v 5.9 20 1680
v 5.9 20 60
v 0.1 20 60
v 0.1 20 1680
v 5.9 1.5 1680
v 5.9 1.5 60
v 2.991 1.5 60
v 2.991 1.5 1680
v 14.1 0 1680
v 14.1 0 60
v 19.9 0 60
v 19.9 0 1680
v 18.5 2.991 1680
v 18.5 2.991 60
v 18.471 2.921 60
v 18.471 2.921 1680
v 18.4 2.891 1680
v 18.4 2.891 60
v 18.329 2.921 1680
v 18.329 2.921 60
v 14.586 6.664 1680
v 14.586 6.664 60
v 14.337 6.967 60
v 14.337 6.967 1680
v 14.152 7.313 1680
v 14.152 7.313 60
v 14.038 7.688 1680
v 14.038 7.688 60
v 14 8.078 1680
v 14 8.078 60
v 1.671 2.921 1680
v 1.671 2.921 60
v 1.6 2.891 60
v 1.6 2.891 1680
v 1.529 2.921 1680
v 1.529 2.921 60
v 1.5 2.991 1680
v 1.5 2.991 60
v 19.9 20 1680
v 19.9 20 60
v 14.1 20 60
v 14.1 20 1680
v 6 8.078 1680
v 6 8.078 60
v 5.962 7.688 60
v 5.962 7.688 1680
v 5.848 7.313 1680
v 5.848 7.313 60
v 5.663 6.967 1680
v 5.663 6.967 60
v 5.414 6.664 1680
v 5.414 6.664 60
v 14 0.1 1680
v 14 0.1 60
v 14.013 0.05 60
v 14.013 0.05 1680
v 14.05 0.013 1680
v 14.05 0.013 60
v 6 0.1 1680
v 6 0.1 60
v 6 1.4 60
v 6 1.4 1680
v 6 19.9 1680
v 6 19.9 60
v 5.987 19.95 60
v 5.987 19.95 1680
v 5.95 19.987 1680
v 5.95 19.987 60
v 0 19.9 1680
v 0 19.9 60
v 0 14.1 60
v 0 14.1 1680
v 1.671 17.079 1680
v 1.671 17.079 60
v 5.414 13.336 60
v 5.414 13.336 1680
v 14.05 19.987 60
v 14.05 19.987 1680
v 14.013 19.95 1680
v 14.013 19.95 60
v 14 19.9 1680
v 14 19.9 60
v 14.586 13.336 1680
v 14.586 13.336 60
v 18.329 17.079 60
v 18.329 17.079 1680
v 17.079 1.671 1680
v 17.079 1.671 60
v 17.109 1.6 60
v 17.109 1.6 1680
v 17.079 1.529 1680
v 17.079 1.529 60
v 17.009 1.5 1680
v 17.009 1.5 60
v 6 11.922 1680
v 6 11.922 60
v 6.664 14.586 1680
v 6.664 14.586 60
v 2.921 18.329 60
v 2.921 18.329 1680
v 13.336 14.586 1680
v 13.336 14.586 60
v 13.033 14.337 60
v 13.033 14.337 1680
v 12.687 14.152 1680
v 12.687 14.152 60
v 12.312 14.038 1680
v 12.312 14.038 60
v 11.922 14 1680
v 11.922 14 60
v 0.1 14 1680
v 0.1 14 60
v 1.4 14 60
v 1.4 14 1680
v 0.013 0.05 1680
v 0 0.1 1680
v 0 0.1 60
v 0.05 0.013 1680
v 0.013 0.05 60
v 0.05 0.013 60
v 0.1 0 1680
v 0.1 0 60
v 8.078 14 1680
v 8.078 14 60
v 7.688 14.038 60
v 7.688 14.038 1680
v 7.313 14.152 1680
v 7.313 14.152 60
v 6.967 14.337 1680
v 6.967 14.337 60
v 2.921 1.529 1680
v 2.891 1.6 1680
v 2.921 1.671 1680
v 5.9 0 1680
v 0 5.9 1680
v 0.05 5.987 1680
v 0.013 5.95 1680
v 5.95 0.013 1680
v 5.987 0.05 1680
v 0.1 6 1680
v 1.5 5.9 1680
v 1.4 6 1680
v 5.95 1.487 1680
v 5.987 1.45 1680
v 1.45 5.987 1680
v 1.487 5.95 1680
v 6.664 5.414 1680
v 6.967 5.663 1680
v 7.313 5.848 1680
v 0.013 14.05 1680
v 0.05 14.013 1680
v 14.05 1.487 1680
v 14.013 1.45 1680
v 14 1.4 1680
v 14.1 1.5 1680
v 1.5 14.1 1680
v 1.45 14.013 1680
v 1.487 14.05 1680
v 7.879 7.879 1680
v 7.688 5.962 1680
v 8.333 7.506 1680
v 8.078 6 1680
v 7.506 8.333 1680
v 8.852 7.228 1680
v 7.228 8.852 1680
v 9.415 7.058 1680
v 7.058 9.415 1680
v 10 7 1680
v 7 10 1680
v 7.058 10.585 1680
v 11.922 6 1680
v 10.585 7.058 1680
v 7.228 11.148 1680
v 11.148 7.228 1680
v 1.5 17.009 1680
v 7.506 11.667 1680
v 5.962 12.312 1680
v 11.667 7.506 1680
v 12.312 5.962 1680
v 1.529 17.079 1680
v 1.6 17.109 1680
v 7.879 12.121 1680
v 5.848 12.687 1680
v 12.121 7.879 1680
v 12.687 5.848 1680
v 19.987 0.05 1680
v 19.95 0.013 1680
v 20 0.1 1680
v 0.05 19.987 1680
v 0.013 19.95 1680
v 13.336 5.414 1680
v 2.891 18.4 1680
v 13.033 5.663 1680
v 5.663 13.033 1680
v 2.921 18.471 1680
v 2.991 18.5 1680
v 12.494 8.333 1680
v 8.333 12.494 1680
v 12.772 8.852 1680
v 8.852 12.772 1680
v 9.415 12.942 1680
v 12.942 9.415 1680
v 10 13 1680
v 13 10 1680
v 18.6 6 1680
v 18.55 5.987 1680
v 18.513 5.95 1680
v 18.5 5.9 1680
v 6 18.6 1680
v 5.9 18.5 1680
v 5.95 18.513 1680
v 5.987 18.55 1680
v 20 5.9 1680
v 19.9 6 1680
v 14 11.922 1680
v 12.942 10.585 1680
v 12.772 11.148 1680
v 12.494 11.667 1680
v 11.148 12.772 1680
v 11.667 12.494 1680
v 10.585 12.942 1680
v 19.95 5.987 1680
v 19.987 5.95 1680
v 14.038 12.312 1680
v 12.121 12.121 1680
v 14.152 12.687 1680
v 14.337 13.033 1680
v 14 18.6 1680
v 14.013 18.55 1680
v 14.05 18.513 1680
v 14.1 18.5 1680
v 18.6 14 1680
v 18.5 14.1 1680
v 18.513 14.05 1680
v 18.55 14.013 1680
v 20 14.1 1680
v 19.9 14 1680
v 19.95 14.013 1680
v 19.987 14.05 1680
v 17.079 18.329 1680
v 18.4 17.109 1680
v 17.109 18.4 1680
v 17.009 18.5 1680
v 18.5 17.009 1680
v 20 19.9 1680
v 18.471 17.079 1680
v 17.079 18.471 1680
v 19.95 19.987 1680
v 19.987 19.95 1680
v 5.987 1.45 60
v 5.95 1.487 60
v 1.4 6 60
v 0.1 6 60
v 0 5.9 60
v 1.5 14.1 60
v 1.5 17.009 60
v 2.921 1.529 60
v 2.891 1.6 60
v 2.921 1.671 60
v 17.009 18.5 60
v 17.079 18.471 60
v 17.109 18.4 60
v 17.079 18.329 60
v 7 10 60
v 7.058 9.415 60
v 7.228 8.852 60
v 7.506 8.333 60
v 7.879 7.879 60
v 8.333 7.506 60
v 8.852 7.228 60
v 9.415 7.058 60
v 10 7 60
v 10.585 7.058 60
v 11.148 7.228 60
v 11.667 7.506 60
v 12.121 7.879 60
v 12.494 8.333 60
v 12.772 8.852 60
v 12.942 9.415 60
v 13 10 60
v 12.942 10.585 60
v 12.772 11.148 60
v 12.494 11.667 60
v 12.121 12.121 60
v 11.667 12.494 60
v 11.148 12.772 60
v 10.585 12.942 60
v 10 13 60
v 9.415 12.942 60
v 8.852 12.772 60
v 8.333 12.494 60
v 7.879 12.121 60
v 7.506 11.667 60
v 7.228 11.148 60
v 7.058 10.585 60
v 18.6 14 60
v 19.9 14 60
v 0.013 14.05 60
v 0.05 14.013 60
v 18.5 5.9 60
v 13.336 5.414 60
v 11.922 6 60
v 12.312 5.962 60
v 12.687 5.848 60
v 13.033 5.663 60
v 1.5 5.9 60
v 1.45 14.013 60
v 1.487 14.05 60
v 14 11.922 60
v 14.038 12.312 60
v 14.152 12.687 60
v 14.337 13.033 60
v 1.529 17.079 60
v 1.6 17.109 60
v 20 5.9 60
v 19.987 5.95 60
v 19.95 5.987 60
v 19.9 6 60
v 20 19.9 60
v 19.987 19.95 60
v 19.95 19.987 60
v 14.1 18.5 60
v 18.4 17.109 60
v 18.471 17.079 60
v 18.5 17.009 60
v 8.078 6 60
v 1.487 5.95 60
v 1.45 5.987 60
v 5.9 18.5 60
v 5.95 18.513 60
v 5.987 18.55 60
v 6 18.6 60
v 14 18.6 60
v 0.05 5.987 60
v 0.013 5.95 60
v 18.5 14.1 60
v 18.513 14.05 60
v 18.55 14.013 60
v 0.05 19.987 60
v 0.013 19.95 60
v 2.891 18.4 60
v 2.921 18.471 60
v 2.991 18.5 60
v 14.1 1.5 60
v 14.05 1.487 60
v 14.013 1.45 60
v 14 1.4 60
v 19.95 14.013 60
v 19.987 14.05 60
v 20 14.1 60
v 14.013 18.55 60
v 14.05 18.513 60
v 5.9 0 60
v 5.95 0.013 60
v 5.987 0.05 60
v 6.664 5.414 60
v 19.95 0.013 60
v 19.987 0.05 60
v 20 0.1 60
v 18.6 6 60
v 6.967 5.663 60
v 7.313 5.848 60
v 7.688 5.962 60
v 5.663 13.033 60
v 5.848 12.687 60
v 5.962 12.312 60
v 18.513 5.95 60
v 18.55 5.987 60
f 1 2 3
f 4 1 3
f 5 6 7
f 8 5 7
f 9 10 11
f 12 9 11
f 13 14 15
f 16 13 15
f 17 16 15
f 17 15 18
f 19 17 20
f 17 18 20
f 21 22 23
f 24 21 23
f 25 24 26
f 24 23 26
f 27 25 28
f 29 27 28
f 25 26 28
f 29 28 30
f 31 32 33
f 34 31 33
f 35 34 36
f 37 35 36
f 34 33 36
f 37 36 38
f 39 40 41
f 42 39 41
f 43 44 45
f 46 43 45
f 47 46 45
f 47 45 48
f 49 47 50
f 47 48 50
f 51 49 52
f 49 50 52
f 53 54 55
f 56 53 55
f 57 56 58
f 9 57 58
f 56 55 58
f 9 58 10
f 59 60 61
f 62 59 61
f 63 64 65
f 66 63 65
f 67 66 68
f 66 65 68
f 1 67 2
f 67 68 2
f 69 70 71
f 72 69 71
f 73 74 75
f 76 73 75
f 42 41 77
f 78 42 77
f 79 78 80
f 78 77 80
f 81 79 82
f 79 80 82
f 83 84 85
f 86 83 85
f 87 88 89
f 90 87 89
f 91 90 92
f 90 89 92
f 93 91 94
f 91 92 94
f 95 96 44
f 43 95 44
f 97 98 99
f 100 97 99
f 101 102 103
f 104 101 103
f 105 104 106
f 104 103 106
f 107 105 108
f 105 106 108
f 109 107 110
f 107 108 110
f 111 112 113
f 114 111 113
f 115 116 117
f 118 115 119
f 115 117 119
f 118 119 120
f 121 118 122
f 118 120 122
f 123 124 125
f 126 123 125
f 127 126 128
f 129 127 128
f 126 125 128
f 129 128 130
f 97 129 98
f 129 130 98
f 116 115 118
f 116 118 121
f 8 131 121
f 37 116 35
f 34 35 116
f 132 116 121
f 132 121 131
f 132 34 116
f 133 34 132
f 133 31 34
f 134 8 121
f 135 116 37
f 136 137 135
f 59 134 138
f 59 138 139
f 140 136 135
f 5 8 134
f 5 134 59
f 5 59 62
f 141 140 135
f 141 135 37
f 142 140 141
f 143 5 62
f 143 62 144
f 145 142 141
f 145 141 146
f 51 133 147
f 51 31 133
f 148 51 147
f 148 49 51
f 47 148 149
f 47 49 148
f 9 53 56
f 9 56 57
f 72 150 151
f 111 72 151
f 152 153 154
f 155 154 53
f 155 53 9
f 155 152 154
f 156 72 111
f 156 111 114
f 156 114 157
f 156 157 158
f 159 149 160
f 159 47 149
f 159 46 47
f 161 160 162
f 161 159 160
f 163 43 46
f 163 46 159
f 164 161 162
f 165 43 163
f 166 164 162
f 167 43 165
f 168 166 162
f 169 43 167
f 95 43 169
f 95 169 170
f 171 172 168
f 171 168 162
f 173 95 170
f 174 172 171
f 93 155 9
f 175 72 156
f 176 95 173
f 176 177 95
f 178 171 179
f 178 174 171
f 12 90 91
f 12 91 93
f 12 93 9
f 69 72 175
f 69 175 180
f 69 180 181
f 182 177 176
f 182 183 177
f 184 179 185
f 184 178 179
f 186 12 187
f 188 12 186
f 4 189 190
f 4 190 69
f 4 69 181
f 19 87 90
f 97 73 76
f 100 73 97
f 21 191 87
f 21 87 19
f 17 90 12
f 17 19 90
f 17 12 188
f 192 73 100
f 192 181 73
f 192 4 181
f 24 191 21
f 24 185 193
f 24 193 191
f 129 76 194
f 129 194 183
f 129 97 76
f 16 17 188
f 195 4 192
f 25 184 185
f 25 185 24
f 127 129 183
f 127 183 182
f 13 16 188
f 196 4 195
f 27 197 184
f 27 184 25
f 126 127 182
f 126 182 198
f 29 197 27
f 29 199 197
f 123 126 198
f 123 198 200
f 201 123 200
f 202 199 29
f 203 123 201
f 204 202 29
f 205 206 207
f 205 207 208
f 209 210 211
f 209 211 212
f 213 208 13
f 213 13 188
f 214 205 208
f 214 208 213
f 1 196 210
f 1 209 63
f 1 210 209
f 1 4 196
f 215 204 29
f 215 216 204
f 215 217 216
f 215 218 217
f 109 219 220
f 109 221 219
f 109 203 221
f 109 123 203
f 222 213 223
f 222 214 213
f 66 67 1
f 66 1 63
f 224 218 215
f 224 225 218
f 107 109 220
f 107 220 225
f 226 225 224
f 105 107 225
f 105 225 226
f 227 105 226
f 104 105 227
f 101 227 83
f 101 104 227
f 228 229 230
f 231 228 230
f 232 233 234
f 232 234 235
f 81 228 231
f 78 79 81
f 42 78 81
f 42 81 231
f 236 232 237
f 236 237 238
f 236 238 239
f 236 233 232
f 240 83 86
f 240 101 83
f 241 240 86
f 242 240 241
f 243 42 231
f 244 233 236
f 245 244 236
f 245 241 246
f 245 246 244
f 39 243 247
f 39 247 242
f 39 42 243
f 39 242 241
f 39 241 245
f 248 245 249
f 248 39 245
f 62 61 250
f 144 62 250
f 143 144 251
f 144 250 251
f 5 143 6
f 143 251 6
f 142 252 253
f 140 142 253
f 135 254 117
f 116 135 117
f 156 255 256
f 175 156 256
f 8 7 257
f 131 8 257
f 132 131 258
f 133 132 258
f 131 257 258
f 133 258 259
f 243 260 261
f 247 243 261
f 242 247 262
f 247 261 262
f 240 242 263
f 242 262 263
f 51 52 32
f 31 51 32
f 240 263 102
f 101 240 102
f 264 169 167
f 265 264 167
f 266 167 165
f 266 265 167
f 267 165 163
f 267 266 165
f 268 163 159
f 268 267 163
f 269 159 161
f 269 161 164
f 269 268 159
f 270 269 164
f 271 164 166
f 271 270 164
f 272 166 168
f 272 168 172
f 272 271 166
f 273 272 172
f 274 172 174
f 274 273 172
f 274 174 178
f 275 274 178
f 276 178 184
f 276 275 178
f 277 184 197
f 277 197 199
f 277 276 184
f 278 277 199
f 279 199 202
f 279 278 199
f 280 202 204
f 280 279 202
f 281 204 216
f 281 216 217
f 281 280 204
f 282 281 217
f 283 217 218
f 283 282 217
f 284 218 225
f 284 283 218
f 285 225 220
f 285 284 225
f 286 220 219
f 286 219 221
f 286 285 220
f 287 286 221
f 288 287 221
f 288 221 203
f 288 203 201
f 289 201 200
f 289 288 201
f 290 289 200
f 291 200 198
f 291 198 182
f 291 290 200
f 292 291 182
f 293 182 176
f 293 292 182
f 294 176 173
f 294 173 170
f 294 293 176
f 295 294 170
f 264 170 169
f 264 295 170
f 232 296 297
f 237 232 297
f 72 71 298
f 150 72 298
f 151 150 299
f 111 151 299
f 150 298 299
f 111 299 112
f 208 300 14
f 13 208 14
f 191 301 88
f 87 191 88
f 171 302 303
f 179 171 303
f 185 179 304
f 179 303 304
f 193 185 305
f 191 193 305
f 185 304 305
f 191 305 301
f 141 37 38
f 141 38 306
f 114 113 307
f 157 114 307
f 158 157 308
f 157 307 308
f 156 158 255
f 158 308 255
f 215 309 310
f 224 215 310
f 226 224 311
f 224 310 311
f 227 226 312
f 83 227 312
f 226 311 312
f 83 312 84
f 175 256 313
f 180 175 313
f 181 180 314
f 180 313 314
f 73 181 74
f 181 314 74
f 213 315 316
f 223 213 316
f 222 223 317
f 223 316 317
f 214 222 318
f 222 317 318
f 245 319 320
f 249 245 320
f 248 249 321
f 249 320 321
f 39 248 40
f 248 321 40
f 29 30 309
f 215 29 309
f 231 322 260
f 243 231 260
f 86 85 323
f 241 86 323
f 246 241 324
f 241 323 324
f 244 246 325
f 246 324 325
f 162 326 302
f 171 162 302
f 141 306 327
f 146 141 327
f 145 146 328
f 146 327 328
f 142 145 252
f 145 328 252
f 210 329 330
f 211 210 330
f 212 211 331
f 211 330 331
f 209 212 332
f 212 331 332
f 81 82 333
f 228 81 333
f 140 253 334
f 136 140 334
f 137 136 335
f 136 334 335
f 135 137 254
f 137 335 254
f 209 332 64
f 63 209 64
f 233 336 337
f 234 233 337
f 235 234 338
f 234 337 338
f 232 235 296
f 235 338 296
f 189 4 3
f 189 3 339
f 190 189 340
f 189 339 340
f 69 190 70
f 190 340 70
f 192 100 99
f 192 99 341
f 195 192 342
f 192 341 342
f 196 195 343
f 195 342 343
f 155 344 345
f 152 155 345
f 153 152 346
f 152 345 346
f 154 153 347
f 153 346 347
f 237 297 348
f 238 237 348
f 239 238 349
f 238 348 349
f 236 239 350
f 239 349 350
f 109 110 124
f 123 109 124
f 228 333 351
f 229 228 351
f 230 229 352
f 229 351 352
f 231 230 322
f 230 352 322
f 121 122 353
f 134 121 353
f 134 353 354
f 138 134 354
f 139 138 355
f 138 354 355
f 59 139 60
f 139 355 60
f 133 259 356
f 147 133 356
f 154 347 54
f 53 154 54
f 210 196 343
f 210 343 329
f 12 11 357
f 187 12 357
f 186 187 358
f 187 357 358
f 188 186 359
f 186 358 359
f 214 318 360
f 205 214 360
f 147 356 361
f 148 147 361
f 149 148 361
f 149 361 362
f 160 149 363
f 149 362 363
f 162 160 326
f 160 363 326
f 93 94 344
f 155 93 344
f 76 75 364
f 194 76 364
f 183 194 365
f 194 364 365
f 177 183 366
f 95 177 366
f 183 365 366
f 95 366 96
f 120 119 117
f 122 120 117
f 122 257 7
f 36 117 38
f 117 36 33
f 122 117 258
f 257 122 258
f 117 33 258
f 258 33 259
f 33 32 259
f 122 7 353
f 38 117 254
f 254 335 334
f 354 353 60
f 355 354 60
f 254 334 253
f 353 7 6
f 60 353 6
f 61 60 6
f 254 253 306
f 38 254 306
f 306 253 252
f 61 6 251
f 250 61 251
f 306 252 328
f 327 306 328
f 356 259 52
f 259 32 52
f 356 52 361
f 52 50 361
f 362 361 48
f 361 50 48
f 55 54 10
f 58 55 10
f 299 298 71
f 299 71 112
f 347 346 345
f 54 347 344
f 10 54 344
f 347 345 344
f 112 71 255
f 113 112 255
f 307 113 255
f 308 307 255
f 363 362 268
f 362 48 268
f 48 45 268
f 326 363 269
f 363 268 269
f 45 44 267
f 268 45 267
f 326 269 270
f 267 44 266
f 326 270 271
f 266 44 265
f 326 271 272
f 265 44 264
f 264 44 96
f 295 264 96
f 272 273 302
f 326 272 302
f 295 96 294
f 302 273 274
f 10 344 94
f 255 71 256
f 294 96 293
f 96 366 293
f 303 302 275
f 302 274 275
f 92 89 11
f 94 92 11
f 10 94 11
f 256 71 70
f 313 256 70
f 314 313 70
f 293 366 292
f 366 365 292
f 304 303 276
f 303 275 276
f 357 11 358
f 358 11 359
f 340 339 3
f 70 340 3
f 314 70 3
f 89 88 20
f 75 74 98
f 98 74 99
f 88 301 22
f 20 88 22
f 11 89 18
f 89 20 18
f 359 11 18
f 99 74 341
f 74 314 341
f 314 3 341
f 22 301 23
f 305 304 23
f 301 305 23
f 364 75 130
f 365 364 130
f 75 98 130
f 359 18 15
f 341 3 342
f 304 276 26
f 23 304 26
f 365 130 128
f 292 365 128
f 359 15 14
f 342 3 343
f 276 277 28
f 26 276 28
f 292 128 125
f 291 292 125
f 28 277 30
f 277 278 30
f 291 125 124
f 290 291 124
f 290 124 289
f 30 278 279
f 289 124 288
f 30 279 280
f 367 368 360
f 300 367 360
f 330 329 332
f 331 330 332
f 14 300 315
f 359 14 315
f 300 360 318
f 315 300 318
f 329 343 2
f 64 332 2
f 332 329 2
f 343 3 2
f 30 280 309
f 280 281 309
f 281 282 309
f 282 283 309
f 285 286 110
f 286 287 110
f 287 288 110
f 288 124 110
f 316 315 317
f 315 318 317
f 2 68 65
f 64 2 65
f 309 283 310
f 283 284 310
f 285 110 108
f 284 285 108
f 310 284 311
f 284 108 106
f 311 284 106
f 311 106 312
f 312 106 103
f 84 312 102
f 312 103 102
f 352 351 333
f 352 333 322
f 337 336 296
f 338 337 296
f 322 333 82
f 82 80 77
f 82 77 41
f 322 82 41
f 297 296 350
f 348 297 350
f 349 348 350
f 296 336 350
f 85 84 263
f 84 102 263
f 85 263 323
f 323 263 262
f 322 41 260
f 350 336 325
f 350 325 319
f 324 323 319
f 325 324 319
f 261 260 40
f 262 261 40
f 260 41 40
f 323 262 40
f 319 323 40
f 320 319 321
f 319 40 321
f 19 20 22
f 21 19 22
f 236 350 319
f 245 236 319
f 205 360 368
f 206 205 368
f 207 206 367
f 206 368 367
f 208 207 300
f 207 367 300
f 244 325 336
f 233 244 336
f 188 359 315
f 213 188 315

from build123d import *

# Parameters (mm, degrees)
SKETCH1_R           = 3
BOSS_EXTRUDE2_DEPTH = 1620


with BuildPart() as part:
    # Sketch1 → Boss-Extrude2 (new body)
    with BuildSketch(Plane.XY.offset(60)):
        with BuildLine():
            Line((18.5, 17.008578644), (18.5, 14.1))
            ThreePointArc((18.5, 14.1), (18.529289322, 14.029289322), (18.6, 14))
            Line((18.6, 14), (19.9, 14))
            ThreePointArc((19.9, 14), (19.970710678, 14.029289322), (20, 14.1))
            Line((20, 14.1), (20, 19.9))
            ThreePointArc((20, 19.9), (19.970710678, 19.970710678), (19.9, 20))
            Line((19.9, 20), (14.1, 20))
            ThreePointArc((14.1, 20), (14.029289322, 19.970710678), (14, 19.9))
            Line((14, 19.9), (14, 18.6))
            ThreePointArc((14, 18.6), (14.029289322, 18.529289322), (14.1, 18.5))
            Line((14.1, 18.5), (17.008578644, 18.5))
            ThreePointArc((17.008578644, 18.5), (17.100966597, 18.438268343), (17.079289322, 18.329289322))
            Line((17.079289322, 18.329289322), (13.335786438, 14.585786438))
            ThreePointArc((13.335786438, 14.585786438), (12.68693974, 14.152240935), (11.921572875, 14))
            Line((11.921572875, 14), (8.078427125, 14))
            ThreePointArc((8.078427125, 14), (7.31306026, 14.152240935), (6.664213562, 14.585786438))
            Line((6.664213562, 14.585786438), (2.920710678, 18.329289322))
            ThreePointArc((2.920710678, 18.329289322), (2.899033403, 18.438268343), (2.991421356, 18.5))
            Line((2.991421356, 18.5), (5.9, 18.5))
            ThreePointArc((5.9, 18.5), (5.970710678, 18.529289322), (6, 18.6))
            Line((6, 18.6), (6, 19.9))
            ThreePointArc((6, 19.9), (5.970710678, 19.970710678), (5.9, 20))
            Line((5.9, 20), (0.1, 20))
            ThreePointArc((0.1, 20), (0.029289322, 19.970710678), (0, 19.9))
            Line((0, 19.9), (0, 14.1))
            ThreePointArc((0, 14.1), (0.029289322, 14.029289322), (0.1, 14))
            Line((0.1, 14), (1.4, 14))
            ThreePointArc((1.4, 14), (1.470710678, 14.029289322), (1.5, 14.1))
            Line((1.5, 14.1), (1.5, 17.008578644))
            ThreePointArc((1.5, 17.008578644), (1.561731657, 17.100966597), (1.670710678, 17.079289322))
            Line((1.670710678, 17.079289322), (5.414213562, 13.335786438))
            ThreePointArc((5.414213562, 13.335786438), (5.847759065, 12.68693974), (6, 11.921572875))
            Line((6, 11.921572875), (6, 8.078427125))
            ThreePointArc((6, 8.078427125), (5.847759065, 7.31306026), (5.414213562, 6.664213562))
            Line((5.414213562, 6.664213562), (1.670710678, 2.920710678))
            ThreePointArc((1.670710678, 2.920710678), (1.561731657, 2.899033403), (1.5, 2.991421356))
            Line((1.5, 2.991421356), (1.5, 5.9))
            ThreePointArc((1.5, 5.9), (1.470710678, 5.970710678), (1.4, 6))
            Line((1.4, 6), (0.1, 6))
            ThreePointArc((0.1, 6), (0.029289322, 5.970710678), (0, 5.9))
            Line((0, 5.9), (0, 0.1))
            ThreePointArc((0, 0.1), (0.029289322, 0.029289322), (0.1, 0))
            Line((0.1, 0), (5.9, 0))
            ThreePointArc((5.9, 0), (5.970710678, 0.029289322), (6, 0.1))
            Line((6, 0.1), (6, 1.4))
            ThreePointArc((6, 1.4), (5.970710678, 1.470710678), (5.9, 1.5))
            Line((5.9, 1.5), (2.991421356, 1.5))
            ThreePointArc((2.991421356, 1.5), (2.899033403, 1.561731657), (2.920710678, 1.670710678))
            Line((2.920710678, 1.670710678), (6.664213562, 5.414213562))
            ThreePointArc((6.664213562, 5.414213562), (7.31306026, 5.847759065), (8.078427125, 6))
            Line((8.078427125, 6), (11.921572875, 6))
            ThreePointArc((11.921572875, 6), (12.68693974, 5.847759065), (13.335786438, 5.414213562))
            Line((13.335786438, 5.414213562), (17.079289322, 1.670710678))
            ThreePointArc((17.079289322, 1.670710678), (17.100966597, 1.561731657), (17.008578644, 1.5))
            Line((17.008578644, 1.5), (14.1, 1.5))
            ThreePointArc((14.1, 1.5), (14.029289322, 1.470710678), (14, 1.4))
            Line((14, 1.4), (14, 0.1))
            ThreePointArc((14, 0.1), (14.029289322, 0.029289322), (14.1, 0))
            Line((14.1, 0), (19.9, 0))
            ThreePointArc((19.9, 0), (19.970710678, 0.029289322), (20, 0.1))
            Line((20, 0.1), (20, 5.9))
            ThreePointArc((20, 5.9), (19.970710678, 5.970710678), (19.9, 6))
            Line((19.9, 6), (18.6, 6))
            ThreePointArc((18.6, 6), (18.529289322, 5.970710678), (18.5, 5.9))
            Line((18.5, 5.9), (18.5, 2.991421356))
            ThreePointArc((18.5, 2.991421356), (18.438268343, 2.899033403), (18.329289322, 2.920710678))
            Line((18.329289322, 2.920710678), (14.585786438, 6.664213562))
            ThreePointArc((14.585786438, 6.664213562), (14.152240935, 7.31306026), (14, 8.078427125))
            Line((14, 8.078427125), (14, 11.921572875))
            ThreePointArc((14, 11.921572875), (14.152240935, 12.68693974), (14.585786438, 13.335786438))
            Line((14.585786438, 13.335786438), (18.329289322, 17.079289322))
            ThreePointArc((18.329289322, 17.079289322), (18.438268343, 17.100966597), (18.5, 17.008578644))
        make_face()
        with Locations(Location((10, 10, 0), (0, 0, 180))):
            Circle(SKETCH1_R, mode=Mode.SUBTRACT)
    extrude(amount=BOSS_EXTRUDE2_DEPTH)


solid = part.part
